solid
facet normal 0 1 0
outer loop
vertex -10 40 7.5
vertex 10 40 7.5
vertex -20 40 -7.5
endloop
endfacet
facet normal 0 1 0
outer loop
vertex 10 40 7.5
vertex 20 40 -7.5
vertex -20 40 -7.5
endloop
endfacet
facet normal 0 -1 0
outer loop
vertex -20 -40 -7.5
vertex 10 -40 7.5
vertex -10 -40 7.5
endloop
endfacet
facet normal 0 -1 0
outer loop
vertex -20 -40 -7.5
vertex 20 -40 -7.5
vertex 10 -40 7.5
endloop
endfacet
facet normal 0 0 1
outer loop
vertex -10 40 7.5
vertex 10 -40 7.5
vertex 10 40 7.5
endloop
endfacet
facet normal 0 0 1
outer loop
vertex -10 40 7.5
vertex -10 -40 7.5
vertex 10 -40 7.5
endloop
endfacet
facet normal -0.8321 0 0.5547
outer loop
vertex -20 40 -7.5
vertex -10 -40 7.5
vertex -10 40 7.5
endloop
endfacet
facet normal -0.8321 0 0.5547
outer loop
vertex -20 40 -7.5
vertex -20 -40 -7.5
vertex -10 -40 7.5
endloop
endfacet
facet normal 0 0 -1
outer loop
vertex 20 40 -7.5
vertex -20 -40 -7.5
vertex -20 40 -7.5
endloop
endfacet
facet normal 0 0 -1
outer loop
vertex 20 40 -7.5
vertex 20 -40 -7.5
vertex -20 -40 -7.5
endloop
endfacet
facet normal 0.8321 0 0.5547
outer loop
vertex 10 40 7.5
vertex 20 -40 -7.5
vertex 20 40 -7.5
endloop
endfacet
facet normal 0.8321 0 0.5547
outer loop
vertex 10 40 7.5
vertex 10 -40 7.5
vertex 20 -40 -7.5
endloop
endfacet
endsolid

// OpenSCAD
//-- Parametros del trapecio
B = 40; //-- Base larga
b = 20; //-- Base corta
h = 15; //-- Altura


//-- Rotar prisma para apoyarlo en plano xy
rotate([90, 0, 0])

//-- Extrusion lineal del trapecio
linear_extrude(height = 80, center = true)

  //-- Trapecio
  polygon(points = [
          [-B/2, -h/2],
	  	  [-b/2, h/2],
          [b/2,  h/2],
          [B/2, -h/2]
          ]);
